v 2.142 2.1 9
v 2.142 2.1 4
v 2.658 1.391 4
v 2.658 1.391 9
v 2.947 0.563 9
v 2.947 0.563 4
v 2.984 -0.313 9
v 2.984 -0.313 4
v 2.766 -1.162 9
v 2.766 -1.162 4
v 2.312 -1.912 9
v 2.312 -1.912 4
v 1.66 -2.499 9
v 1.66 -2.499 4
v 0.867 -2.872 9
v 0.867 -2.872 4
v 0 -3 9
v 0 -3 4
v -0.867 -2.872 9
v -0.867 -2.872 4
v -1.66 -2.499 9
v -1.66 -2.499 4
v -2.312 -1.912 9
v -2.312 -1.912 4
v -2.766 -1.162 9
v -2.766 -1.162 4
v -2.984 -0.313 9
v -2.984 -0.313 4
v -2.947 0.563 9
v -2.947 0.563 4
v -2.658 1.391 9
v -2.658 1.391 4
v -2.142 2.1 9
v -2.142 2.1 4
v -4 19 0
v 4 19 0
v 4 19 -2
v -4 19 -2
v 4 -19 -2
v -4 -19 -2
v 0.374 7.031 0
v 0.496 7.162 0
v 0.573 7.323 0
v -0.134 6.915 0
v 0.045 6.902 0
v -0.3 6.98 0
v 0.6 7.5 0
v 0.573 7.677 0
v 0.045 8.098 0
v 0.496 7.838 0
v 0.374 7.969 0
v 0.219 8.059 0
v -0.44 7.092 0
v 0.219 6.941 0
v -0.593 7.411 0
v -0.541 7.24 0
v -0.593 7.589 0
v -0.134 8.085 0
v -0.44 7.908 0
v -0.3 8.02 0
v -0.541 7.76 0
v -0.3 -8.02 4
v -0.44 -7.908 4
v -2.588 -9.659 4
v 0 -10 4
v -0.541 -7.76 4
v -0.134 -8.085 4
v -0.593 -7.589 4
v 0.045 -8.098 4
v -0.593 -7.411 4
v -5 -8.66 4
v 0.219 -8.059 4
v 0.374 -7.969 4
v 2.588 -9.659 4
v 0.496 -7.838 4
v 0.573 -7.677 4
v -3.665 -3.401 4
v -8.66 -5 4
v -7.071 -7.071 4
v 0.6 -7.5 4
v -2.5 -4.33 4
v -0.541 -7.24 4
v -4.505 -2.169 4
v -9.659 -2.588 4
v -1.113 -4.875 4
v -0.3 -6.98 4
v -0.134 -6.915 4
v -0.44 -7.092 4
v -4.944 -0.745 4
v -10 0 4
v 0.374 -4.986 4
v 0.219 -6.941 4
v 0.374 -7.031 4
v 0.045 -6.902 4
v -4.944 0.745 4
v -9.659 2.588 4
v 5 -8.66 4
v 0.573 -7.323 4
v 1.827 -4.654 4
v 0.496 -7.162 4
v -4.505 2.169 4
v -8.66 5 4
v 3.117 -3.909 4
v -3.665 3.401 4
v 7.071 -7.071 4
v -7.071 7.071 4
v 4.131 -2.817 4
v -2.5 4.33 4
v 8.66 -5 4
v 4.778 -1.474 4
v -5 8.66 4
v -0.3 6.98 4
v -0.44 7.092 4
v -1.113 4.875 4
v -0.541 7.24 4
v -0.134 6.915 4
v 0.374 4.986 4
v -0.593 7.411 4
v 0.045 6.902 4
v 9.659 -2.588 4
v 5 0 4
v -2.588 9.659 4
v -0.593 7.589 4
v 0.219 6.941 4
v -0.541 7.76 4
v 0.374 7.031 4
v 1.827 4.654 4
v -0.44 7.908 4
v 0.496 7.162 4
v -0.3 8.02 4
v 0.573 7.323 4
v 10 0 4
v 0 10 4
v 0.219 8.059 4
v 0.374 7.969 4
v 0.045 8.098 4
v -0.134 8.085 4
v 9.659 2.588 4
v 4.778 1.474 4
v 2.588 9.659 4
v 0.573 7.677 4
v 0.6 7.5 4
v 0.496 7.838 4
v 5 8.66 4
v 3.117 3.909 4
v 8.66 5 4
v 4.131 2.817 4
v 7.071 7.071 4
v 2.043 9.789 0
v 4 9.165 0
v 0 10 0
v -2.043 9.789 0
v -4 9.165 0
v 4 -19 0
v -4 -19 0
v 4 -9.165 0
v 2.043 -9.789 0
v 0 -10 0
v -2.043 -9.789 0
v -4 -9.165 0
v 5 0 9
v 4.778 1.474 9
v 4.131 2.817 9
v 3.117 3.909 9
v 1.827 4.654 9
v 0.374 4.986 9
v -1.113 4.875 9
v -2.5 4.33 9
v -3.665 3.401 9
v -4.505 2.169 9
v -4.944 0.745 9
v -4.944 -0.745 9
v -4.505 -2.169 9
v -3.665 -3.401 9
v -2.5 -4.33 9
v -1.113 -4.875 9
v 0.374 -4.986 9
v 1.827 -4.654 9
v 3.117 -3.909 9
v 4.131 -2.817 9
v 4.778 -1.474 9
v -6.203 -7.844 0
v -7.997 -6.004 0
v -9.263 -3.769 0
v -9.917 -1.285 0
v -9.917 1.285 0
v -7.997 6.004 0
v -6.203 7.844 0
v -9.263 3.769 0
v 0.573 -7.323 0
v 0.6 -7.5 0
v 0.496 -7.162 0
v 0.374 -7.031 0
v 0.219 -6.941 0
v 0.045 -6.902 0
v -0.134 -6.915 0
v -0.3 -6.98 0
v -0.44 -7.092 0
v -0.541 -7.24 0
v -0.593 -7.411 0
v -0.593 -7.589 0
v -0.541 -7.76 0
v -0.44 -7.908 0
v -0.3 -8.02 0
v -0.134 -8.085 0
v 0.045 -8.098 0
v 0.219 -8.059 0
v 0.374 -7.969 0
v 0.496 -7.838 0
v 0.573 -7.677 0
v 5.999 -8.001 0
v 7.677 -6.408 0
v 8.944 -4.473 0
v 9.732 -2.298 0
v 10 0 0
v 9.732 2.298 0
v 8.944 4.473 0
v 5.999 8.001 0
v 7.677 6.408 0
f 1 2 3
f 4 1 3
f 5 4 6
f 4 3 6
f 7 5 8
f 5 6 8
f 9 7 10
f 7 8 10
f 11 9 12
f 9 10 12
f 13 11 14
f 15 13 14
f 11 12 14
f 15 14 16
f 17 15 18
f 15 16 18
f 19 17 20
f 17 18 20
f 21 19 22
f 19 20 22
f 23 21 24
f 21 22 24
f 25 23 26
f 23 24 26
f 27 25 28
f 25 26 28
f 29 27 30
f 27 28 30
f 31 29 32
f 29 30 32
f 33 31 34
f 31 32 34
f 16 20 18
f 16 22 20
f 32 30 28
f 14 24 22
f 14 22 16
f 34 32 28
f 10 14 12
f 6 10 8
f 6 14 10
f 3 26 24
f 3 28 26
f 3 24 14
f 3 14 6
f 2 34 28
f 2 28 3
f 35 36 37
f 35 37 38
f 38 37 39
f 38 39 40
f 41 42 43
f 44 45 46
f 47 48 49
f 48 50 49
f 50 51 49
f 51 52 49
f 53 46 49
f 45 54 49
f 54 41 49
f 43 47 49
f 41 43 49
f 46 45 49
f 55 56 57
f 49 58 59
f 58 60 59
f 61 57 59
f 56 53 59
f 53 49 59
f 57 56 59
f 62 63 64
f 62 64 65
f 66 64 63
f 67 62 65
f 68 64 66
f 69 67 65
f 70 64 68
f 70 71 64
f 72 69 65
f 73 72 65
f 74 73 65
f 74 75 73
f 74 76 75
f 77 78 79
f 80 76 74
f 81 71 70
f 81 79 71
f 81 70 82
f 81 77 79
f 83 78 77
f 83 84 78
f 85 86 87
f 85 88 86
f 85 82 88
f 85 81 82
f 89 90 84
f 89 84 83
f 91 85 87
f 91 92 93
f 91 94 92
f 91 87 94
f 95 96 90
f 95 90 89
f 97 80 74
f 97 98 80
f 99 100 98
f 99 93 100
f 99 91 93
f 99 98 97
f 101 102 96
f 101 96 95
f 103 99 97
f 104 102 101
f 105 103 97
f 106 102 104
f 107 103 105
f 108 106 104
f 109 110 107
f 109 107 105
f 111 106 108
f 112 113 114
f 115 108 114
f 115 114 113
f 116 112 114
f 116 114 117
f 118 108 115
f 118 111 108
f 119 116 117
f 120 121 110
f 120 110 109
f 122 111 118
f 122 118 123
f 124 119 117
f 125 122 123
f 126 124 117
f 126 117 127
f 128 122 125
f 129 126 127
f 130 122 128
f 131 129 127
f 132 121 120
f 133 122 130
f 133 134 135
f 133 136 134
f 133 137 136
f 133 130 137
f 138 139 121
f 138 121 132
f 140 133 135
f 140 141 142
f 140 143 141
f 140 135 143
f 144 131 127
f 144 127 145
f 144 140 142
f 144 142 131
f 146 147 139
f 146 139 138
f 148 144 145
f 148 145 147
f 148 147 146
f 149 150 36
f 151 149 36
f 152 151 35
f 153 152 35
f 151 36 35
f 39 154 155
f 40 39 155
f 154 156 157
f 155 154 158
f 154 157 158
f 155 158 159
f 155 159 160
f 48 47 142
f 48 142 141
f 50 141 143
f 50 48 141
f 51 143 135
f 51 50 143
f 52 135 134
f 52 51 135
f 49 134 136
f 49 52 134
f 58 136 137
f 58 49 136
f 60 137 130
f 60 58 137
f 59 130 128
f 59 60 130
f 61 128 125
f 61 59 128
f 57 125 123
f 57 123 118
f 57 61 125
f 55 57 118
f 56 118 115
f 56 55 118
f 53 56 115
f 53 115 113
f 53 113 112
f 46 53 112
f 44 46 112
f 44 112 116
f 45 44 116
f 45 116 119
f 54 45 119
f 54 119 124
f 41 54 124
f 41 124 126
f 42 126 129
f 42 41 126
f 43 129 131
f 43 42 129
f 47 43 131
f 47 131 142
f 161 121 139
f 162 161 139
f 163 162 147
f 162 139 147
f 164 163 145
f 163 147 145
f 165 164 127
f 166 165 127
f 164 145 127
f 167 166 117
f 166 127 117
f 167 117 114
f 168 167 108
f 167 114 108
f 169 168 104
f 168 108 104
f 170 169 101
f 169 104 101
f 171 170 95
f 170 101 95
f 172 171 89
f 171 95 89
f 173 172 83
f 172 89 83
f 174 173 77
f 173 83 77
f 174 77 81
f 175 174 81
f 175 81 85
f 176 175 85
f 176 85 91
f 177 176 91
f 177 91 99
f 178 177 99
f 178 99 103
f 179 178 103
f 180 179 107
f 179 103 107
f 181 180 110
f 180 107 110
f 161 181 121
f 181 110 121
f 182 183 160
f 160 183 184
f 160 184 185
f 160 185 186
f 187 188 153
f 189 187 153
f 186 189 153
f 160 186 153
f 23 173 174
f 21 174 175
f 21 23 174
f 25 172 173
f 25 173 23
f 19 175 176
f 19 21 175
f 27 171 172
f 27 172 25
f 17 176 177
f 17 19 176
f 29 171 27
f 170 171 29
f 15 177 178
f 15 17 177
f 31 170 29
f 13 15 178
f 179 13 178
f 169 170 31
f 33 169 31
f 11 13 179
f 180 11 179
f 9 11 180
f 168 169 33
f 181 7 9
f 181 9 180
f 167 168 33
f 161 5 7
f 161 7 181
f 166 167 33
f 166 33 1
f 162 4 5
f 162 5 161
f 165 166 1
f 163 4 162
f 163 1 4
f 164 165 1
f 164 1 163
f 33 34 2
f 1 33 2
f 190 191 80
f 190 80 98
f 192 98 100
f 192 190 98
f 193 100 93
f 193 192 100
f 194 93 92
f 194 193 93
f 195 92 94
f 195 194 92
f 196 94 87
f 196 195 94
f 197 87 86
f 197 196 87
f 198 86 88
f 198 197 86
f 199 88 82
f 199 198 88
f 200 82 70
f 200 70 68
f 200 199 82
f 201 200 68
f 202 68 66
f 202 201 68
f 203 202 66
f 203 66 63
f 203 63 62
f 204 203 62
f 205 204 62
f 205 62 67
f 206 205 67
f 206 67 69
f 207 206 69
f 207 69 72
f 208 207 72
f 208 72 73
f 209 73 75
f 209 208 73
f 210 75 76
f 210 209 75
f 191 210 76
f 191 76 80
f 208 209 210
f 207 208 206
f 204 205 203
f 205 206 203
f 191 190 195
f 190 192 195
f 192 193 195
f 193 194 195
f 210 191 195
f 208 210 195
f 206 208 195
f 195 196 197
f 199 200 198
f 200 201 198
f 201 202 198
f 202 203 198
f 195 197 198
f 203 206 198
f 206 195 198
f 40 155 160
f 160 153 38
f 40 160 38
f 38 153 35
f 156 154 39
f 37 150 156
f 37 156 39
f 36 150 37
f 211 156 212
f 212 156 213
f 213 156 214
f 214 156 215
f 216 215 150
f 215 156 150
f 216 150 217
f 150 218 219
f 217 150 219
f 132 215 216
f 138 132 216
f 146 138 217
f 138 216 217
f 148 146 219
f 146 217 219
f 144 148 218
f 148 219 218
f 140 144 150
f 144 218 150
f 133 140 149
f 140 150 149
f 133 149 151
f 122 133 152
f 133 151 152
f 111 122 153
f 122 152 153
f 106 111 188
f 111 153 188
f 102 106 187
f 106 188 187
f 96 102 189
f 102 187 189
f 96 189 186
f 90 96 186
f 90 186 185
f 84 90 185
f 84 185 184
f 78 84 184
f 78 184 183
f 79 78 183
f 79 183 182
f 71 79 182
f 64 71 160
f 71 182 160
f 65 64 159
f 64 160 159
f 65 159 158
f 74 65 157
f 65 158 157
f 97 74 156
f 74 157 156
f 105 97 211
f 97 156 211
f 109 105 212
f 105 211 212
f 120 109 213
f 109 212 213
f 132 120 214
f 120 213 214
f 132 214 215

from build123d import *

# Parameters (mm, degrees)
ESQUISSE1_R        = 10
ESQUISSE1_R_2      = 0.6
BOSS_EXTRU_1_DEPTH = 4
ESQUISSE3_R        = 5
BOSS_EXTRU_2_DEPTH = 5
ESQUISSE4_W        = 8
ESQUISSE4_H        = 38
BOSS_EXTRU_3_DEPTH = 2


with BuildPart() as part:
    # Esquisse1 → Boss.-Extru.1 (new body)
    with BuildSketch(Plane.XY):
        Circle(ESQUISSE1_R)
        with Locations((0, -7.5)):
            Circle(ESQUISSE1_R_2, mode=Mode.SUBTRACT)
        with Locations((0, 7.5)):
            Circle(ESQUISSE1_R_2, mode=Mode.SUBTRACT)
    extrude(amount=BOSS_EXTRU_1_DEPTH)

    # Esquisse3 → Boss.-Extru.2 (add)
    with BuildSketch(Plane.XY.offset(4)):
        Circle(ESQUISSE3_R)
        with BuildLine():
            Line((-2.142428529, 2.1), (2.142428529, 2.1))
            ThreePointArc((2.142428529, 2.1), (0, -3), (-2.142428529, 2.1))
        make_face(mode=Mode.SUBTRACT)
    extrude(amount=BOSS_EXTRU_2_DEPTH)

    # Esquisse4 → Boss.-Extru.3 (add)
    with BuildSketch(Plane(origin=(0, 0, 0), x_dir=(-1, 0, 0), z_dir=(0, 0, -1))):
        Rectangle(ESQUISSE4_W, ESQUISSE4_H)
    extrude(amount=BOSS_EXTRU_3_DEPTH)


solid = part.part
